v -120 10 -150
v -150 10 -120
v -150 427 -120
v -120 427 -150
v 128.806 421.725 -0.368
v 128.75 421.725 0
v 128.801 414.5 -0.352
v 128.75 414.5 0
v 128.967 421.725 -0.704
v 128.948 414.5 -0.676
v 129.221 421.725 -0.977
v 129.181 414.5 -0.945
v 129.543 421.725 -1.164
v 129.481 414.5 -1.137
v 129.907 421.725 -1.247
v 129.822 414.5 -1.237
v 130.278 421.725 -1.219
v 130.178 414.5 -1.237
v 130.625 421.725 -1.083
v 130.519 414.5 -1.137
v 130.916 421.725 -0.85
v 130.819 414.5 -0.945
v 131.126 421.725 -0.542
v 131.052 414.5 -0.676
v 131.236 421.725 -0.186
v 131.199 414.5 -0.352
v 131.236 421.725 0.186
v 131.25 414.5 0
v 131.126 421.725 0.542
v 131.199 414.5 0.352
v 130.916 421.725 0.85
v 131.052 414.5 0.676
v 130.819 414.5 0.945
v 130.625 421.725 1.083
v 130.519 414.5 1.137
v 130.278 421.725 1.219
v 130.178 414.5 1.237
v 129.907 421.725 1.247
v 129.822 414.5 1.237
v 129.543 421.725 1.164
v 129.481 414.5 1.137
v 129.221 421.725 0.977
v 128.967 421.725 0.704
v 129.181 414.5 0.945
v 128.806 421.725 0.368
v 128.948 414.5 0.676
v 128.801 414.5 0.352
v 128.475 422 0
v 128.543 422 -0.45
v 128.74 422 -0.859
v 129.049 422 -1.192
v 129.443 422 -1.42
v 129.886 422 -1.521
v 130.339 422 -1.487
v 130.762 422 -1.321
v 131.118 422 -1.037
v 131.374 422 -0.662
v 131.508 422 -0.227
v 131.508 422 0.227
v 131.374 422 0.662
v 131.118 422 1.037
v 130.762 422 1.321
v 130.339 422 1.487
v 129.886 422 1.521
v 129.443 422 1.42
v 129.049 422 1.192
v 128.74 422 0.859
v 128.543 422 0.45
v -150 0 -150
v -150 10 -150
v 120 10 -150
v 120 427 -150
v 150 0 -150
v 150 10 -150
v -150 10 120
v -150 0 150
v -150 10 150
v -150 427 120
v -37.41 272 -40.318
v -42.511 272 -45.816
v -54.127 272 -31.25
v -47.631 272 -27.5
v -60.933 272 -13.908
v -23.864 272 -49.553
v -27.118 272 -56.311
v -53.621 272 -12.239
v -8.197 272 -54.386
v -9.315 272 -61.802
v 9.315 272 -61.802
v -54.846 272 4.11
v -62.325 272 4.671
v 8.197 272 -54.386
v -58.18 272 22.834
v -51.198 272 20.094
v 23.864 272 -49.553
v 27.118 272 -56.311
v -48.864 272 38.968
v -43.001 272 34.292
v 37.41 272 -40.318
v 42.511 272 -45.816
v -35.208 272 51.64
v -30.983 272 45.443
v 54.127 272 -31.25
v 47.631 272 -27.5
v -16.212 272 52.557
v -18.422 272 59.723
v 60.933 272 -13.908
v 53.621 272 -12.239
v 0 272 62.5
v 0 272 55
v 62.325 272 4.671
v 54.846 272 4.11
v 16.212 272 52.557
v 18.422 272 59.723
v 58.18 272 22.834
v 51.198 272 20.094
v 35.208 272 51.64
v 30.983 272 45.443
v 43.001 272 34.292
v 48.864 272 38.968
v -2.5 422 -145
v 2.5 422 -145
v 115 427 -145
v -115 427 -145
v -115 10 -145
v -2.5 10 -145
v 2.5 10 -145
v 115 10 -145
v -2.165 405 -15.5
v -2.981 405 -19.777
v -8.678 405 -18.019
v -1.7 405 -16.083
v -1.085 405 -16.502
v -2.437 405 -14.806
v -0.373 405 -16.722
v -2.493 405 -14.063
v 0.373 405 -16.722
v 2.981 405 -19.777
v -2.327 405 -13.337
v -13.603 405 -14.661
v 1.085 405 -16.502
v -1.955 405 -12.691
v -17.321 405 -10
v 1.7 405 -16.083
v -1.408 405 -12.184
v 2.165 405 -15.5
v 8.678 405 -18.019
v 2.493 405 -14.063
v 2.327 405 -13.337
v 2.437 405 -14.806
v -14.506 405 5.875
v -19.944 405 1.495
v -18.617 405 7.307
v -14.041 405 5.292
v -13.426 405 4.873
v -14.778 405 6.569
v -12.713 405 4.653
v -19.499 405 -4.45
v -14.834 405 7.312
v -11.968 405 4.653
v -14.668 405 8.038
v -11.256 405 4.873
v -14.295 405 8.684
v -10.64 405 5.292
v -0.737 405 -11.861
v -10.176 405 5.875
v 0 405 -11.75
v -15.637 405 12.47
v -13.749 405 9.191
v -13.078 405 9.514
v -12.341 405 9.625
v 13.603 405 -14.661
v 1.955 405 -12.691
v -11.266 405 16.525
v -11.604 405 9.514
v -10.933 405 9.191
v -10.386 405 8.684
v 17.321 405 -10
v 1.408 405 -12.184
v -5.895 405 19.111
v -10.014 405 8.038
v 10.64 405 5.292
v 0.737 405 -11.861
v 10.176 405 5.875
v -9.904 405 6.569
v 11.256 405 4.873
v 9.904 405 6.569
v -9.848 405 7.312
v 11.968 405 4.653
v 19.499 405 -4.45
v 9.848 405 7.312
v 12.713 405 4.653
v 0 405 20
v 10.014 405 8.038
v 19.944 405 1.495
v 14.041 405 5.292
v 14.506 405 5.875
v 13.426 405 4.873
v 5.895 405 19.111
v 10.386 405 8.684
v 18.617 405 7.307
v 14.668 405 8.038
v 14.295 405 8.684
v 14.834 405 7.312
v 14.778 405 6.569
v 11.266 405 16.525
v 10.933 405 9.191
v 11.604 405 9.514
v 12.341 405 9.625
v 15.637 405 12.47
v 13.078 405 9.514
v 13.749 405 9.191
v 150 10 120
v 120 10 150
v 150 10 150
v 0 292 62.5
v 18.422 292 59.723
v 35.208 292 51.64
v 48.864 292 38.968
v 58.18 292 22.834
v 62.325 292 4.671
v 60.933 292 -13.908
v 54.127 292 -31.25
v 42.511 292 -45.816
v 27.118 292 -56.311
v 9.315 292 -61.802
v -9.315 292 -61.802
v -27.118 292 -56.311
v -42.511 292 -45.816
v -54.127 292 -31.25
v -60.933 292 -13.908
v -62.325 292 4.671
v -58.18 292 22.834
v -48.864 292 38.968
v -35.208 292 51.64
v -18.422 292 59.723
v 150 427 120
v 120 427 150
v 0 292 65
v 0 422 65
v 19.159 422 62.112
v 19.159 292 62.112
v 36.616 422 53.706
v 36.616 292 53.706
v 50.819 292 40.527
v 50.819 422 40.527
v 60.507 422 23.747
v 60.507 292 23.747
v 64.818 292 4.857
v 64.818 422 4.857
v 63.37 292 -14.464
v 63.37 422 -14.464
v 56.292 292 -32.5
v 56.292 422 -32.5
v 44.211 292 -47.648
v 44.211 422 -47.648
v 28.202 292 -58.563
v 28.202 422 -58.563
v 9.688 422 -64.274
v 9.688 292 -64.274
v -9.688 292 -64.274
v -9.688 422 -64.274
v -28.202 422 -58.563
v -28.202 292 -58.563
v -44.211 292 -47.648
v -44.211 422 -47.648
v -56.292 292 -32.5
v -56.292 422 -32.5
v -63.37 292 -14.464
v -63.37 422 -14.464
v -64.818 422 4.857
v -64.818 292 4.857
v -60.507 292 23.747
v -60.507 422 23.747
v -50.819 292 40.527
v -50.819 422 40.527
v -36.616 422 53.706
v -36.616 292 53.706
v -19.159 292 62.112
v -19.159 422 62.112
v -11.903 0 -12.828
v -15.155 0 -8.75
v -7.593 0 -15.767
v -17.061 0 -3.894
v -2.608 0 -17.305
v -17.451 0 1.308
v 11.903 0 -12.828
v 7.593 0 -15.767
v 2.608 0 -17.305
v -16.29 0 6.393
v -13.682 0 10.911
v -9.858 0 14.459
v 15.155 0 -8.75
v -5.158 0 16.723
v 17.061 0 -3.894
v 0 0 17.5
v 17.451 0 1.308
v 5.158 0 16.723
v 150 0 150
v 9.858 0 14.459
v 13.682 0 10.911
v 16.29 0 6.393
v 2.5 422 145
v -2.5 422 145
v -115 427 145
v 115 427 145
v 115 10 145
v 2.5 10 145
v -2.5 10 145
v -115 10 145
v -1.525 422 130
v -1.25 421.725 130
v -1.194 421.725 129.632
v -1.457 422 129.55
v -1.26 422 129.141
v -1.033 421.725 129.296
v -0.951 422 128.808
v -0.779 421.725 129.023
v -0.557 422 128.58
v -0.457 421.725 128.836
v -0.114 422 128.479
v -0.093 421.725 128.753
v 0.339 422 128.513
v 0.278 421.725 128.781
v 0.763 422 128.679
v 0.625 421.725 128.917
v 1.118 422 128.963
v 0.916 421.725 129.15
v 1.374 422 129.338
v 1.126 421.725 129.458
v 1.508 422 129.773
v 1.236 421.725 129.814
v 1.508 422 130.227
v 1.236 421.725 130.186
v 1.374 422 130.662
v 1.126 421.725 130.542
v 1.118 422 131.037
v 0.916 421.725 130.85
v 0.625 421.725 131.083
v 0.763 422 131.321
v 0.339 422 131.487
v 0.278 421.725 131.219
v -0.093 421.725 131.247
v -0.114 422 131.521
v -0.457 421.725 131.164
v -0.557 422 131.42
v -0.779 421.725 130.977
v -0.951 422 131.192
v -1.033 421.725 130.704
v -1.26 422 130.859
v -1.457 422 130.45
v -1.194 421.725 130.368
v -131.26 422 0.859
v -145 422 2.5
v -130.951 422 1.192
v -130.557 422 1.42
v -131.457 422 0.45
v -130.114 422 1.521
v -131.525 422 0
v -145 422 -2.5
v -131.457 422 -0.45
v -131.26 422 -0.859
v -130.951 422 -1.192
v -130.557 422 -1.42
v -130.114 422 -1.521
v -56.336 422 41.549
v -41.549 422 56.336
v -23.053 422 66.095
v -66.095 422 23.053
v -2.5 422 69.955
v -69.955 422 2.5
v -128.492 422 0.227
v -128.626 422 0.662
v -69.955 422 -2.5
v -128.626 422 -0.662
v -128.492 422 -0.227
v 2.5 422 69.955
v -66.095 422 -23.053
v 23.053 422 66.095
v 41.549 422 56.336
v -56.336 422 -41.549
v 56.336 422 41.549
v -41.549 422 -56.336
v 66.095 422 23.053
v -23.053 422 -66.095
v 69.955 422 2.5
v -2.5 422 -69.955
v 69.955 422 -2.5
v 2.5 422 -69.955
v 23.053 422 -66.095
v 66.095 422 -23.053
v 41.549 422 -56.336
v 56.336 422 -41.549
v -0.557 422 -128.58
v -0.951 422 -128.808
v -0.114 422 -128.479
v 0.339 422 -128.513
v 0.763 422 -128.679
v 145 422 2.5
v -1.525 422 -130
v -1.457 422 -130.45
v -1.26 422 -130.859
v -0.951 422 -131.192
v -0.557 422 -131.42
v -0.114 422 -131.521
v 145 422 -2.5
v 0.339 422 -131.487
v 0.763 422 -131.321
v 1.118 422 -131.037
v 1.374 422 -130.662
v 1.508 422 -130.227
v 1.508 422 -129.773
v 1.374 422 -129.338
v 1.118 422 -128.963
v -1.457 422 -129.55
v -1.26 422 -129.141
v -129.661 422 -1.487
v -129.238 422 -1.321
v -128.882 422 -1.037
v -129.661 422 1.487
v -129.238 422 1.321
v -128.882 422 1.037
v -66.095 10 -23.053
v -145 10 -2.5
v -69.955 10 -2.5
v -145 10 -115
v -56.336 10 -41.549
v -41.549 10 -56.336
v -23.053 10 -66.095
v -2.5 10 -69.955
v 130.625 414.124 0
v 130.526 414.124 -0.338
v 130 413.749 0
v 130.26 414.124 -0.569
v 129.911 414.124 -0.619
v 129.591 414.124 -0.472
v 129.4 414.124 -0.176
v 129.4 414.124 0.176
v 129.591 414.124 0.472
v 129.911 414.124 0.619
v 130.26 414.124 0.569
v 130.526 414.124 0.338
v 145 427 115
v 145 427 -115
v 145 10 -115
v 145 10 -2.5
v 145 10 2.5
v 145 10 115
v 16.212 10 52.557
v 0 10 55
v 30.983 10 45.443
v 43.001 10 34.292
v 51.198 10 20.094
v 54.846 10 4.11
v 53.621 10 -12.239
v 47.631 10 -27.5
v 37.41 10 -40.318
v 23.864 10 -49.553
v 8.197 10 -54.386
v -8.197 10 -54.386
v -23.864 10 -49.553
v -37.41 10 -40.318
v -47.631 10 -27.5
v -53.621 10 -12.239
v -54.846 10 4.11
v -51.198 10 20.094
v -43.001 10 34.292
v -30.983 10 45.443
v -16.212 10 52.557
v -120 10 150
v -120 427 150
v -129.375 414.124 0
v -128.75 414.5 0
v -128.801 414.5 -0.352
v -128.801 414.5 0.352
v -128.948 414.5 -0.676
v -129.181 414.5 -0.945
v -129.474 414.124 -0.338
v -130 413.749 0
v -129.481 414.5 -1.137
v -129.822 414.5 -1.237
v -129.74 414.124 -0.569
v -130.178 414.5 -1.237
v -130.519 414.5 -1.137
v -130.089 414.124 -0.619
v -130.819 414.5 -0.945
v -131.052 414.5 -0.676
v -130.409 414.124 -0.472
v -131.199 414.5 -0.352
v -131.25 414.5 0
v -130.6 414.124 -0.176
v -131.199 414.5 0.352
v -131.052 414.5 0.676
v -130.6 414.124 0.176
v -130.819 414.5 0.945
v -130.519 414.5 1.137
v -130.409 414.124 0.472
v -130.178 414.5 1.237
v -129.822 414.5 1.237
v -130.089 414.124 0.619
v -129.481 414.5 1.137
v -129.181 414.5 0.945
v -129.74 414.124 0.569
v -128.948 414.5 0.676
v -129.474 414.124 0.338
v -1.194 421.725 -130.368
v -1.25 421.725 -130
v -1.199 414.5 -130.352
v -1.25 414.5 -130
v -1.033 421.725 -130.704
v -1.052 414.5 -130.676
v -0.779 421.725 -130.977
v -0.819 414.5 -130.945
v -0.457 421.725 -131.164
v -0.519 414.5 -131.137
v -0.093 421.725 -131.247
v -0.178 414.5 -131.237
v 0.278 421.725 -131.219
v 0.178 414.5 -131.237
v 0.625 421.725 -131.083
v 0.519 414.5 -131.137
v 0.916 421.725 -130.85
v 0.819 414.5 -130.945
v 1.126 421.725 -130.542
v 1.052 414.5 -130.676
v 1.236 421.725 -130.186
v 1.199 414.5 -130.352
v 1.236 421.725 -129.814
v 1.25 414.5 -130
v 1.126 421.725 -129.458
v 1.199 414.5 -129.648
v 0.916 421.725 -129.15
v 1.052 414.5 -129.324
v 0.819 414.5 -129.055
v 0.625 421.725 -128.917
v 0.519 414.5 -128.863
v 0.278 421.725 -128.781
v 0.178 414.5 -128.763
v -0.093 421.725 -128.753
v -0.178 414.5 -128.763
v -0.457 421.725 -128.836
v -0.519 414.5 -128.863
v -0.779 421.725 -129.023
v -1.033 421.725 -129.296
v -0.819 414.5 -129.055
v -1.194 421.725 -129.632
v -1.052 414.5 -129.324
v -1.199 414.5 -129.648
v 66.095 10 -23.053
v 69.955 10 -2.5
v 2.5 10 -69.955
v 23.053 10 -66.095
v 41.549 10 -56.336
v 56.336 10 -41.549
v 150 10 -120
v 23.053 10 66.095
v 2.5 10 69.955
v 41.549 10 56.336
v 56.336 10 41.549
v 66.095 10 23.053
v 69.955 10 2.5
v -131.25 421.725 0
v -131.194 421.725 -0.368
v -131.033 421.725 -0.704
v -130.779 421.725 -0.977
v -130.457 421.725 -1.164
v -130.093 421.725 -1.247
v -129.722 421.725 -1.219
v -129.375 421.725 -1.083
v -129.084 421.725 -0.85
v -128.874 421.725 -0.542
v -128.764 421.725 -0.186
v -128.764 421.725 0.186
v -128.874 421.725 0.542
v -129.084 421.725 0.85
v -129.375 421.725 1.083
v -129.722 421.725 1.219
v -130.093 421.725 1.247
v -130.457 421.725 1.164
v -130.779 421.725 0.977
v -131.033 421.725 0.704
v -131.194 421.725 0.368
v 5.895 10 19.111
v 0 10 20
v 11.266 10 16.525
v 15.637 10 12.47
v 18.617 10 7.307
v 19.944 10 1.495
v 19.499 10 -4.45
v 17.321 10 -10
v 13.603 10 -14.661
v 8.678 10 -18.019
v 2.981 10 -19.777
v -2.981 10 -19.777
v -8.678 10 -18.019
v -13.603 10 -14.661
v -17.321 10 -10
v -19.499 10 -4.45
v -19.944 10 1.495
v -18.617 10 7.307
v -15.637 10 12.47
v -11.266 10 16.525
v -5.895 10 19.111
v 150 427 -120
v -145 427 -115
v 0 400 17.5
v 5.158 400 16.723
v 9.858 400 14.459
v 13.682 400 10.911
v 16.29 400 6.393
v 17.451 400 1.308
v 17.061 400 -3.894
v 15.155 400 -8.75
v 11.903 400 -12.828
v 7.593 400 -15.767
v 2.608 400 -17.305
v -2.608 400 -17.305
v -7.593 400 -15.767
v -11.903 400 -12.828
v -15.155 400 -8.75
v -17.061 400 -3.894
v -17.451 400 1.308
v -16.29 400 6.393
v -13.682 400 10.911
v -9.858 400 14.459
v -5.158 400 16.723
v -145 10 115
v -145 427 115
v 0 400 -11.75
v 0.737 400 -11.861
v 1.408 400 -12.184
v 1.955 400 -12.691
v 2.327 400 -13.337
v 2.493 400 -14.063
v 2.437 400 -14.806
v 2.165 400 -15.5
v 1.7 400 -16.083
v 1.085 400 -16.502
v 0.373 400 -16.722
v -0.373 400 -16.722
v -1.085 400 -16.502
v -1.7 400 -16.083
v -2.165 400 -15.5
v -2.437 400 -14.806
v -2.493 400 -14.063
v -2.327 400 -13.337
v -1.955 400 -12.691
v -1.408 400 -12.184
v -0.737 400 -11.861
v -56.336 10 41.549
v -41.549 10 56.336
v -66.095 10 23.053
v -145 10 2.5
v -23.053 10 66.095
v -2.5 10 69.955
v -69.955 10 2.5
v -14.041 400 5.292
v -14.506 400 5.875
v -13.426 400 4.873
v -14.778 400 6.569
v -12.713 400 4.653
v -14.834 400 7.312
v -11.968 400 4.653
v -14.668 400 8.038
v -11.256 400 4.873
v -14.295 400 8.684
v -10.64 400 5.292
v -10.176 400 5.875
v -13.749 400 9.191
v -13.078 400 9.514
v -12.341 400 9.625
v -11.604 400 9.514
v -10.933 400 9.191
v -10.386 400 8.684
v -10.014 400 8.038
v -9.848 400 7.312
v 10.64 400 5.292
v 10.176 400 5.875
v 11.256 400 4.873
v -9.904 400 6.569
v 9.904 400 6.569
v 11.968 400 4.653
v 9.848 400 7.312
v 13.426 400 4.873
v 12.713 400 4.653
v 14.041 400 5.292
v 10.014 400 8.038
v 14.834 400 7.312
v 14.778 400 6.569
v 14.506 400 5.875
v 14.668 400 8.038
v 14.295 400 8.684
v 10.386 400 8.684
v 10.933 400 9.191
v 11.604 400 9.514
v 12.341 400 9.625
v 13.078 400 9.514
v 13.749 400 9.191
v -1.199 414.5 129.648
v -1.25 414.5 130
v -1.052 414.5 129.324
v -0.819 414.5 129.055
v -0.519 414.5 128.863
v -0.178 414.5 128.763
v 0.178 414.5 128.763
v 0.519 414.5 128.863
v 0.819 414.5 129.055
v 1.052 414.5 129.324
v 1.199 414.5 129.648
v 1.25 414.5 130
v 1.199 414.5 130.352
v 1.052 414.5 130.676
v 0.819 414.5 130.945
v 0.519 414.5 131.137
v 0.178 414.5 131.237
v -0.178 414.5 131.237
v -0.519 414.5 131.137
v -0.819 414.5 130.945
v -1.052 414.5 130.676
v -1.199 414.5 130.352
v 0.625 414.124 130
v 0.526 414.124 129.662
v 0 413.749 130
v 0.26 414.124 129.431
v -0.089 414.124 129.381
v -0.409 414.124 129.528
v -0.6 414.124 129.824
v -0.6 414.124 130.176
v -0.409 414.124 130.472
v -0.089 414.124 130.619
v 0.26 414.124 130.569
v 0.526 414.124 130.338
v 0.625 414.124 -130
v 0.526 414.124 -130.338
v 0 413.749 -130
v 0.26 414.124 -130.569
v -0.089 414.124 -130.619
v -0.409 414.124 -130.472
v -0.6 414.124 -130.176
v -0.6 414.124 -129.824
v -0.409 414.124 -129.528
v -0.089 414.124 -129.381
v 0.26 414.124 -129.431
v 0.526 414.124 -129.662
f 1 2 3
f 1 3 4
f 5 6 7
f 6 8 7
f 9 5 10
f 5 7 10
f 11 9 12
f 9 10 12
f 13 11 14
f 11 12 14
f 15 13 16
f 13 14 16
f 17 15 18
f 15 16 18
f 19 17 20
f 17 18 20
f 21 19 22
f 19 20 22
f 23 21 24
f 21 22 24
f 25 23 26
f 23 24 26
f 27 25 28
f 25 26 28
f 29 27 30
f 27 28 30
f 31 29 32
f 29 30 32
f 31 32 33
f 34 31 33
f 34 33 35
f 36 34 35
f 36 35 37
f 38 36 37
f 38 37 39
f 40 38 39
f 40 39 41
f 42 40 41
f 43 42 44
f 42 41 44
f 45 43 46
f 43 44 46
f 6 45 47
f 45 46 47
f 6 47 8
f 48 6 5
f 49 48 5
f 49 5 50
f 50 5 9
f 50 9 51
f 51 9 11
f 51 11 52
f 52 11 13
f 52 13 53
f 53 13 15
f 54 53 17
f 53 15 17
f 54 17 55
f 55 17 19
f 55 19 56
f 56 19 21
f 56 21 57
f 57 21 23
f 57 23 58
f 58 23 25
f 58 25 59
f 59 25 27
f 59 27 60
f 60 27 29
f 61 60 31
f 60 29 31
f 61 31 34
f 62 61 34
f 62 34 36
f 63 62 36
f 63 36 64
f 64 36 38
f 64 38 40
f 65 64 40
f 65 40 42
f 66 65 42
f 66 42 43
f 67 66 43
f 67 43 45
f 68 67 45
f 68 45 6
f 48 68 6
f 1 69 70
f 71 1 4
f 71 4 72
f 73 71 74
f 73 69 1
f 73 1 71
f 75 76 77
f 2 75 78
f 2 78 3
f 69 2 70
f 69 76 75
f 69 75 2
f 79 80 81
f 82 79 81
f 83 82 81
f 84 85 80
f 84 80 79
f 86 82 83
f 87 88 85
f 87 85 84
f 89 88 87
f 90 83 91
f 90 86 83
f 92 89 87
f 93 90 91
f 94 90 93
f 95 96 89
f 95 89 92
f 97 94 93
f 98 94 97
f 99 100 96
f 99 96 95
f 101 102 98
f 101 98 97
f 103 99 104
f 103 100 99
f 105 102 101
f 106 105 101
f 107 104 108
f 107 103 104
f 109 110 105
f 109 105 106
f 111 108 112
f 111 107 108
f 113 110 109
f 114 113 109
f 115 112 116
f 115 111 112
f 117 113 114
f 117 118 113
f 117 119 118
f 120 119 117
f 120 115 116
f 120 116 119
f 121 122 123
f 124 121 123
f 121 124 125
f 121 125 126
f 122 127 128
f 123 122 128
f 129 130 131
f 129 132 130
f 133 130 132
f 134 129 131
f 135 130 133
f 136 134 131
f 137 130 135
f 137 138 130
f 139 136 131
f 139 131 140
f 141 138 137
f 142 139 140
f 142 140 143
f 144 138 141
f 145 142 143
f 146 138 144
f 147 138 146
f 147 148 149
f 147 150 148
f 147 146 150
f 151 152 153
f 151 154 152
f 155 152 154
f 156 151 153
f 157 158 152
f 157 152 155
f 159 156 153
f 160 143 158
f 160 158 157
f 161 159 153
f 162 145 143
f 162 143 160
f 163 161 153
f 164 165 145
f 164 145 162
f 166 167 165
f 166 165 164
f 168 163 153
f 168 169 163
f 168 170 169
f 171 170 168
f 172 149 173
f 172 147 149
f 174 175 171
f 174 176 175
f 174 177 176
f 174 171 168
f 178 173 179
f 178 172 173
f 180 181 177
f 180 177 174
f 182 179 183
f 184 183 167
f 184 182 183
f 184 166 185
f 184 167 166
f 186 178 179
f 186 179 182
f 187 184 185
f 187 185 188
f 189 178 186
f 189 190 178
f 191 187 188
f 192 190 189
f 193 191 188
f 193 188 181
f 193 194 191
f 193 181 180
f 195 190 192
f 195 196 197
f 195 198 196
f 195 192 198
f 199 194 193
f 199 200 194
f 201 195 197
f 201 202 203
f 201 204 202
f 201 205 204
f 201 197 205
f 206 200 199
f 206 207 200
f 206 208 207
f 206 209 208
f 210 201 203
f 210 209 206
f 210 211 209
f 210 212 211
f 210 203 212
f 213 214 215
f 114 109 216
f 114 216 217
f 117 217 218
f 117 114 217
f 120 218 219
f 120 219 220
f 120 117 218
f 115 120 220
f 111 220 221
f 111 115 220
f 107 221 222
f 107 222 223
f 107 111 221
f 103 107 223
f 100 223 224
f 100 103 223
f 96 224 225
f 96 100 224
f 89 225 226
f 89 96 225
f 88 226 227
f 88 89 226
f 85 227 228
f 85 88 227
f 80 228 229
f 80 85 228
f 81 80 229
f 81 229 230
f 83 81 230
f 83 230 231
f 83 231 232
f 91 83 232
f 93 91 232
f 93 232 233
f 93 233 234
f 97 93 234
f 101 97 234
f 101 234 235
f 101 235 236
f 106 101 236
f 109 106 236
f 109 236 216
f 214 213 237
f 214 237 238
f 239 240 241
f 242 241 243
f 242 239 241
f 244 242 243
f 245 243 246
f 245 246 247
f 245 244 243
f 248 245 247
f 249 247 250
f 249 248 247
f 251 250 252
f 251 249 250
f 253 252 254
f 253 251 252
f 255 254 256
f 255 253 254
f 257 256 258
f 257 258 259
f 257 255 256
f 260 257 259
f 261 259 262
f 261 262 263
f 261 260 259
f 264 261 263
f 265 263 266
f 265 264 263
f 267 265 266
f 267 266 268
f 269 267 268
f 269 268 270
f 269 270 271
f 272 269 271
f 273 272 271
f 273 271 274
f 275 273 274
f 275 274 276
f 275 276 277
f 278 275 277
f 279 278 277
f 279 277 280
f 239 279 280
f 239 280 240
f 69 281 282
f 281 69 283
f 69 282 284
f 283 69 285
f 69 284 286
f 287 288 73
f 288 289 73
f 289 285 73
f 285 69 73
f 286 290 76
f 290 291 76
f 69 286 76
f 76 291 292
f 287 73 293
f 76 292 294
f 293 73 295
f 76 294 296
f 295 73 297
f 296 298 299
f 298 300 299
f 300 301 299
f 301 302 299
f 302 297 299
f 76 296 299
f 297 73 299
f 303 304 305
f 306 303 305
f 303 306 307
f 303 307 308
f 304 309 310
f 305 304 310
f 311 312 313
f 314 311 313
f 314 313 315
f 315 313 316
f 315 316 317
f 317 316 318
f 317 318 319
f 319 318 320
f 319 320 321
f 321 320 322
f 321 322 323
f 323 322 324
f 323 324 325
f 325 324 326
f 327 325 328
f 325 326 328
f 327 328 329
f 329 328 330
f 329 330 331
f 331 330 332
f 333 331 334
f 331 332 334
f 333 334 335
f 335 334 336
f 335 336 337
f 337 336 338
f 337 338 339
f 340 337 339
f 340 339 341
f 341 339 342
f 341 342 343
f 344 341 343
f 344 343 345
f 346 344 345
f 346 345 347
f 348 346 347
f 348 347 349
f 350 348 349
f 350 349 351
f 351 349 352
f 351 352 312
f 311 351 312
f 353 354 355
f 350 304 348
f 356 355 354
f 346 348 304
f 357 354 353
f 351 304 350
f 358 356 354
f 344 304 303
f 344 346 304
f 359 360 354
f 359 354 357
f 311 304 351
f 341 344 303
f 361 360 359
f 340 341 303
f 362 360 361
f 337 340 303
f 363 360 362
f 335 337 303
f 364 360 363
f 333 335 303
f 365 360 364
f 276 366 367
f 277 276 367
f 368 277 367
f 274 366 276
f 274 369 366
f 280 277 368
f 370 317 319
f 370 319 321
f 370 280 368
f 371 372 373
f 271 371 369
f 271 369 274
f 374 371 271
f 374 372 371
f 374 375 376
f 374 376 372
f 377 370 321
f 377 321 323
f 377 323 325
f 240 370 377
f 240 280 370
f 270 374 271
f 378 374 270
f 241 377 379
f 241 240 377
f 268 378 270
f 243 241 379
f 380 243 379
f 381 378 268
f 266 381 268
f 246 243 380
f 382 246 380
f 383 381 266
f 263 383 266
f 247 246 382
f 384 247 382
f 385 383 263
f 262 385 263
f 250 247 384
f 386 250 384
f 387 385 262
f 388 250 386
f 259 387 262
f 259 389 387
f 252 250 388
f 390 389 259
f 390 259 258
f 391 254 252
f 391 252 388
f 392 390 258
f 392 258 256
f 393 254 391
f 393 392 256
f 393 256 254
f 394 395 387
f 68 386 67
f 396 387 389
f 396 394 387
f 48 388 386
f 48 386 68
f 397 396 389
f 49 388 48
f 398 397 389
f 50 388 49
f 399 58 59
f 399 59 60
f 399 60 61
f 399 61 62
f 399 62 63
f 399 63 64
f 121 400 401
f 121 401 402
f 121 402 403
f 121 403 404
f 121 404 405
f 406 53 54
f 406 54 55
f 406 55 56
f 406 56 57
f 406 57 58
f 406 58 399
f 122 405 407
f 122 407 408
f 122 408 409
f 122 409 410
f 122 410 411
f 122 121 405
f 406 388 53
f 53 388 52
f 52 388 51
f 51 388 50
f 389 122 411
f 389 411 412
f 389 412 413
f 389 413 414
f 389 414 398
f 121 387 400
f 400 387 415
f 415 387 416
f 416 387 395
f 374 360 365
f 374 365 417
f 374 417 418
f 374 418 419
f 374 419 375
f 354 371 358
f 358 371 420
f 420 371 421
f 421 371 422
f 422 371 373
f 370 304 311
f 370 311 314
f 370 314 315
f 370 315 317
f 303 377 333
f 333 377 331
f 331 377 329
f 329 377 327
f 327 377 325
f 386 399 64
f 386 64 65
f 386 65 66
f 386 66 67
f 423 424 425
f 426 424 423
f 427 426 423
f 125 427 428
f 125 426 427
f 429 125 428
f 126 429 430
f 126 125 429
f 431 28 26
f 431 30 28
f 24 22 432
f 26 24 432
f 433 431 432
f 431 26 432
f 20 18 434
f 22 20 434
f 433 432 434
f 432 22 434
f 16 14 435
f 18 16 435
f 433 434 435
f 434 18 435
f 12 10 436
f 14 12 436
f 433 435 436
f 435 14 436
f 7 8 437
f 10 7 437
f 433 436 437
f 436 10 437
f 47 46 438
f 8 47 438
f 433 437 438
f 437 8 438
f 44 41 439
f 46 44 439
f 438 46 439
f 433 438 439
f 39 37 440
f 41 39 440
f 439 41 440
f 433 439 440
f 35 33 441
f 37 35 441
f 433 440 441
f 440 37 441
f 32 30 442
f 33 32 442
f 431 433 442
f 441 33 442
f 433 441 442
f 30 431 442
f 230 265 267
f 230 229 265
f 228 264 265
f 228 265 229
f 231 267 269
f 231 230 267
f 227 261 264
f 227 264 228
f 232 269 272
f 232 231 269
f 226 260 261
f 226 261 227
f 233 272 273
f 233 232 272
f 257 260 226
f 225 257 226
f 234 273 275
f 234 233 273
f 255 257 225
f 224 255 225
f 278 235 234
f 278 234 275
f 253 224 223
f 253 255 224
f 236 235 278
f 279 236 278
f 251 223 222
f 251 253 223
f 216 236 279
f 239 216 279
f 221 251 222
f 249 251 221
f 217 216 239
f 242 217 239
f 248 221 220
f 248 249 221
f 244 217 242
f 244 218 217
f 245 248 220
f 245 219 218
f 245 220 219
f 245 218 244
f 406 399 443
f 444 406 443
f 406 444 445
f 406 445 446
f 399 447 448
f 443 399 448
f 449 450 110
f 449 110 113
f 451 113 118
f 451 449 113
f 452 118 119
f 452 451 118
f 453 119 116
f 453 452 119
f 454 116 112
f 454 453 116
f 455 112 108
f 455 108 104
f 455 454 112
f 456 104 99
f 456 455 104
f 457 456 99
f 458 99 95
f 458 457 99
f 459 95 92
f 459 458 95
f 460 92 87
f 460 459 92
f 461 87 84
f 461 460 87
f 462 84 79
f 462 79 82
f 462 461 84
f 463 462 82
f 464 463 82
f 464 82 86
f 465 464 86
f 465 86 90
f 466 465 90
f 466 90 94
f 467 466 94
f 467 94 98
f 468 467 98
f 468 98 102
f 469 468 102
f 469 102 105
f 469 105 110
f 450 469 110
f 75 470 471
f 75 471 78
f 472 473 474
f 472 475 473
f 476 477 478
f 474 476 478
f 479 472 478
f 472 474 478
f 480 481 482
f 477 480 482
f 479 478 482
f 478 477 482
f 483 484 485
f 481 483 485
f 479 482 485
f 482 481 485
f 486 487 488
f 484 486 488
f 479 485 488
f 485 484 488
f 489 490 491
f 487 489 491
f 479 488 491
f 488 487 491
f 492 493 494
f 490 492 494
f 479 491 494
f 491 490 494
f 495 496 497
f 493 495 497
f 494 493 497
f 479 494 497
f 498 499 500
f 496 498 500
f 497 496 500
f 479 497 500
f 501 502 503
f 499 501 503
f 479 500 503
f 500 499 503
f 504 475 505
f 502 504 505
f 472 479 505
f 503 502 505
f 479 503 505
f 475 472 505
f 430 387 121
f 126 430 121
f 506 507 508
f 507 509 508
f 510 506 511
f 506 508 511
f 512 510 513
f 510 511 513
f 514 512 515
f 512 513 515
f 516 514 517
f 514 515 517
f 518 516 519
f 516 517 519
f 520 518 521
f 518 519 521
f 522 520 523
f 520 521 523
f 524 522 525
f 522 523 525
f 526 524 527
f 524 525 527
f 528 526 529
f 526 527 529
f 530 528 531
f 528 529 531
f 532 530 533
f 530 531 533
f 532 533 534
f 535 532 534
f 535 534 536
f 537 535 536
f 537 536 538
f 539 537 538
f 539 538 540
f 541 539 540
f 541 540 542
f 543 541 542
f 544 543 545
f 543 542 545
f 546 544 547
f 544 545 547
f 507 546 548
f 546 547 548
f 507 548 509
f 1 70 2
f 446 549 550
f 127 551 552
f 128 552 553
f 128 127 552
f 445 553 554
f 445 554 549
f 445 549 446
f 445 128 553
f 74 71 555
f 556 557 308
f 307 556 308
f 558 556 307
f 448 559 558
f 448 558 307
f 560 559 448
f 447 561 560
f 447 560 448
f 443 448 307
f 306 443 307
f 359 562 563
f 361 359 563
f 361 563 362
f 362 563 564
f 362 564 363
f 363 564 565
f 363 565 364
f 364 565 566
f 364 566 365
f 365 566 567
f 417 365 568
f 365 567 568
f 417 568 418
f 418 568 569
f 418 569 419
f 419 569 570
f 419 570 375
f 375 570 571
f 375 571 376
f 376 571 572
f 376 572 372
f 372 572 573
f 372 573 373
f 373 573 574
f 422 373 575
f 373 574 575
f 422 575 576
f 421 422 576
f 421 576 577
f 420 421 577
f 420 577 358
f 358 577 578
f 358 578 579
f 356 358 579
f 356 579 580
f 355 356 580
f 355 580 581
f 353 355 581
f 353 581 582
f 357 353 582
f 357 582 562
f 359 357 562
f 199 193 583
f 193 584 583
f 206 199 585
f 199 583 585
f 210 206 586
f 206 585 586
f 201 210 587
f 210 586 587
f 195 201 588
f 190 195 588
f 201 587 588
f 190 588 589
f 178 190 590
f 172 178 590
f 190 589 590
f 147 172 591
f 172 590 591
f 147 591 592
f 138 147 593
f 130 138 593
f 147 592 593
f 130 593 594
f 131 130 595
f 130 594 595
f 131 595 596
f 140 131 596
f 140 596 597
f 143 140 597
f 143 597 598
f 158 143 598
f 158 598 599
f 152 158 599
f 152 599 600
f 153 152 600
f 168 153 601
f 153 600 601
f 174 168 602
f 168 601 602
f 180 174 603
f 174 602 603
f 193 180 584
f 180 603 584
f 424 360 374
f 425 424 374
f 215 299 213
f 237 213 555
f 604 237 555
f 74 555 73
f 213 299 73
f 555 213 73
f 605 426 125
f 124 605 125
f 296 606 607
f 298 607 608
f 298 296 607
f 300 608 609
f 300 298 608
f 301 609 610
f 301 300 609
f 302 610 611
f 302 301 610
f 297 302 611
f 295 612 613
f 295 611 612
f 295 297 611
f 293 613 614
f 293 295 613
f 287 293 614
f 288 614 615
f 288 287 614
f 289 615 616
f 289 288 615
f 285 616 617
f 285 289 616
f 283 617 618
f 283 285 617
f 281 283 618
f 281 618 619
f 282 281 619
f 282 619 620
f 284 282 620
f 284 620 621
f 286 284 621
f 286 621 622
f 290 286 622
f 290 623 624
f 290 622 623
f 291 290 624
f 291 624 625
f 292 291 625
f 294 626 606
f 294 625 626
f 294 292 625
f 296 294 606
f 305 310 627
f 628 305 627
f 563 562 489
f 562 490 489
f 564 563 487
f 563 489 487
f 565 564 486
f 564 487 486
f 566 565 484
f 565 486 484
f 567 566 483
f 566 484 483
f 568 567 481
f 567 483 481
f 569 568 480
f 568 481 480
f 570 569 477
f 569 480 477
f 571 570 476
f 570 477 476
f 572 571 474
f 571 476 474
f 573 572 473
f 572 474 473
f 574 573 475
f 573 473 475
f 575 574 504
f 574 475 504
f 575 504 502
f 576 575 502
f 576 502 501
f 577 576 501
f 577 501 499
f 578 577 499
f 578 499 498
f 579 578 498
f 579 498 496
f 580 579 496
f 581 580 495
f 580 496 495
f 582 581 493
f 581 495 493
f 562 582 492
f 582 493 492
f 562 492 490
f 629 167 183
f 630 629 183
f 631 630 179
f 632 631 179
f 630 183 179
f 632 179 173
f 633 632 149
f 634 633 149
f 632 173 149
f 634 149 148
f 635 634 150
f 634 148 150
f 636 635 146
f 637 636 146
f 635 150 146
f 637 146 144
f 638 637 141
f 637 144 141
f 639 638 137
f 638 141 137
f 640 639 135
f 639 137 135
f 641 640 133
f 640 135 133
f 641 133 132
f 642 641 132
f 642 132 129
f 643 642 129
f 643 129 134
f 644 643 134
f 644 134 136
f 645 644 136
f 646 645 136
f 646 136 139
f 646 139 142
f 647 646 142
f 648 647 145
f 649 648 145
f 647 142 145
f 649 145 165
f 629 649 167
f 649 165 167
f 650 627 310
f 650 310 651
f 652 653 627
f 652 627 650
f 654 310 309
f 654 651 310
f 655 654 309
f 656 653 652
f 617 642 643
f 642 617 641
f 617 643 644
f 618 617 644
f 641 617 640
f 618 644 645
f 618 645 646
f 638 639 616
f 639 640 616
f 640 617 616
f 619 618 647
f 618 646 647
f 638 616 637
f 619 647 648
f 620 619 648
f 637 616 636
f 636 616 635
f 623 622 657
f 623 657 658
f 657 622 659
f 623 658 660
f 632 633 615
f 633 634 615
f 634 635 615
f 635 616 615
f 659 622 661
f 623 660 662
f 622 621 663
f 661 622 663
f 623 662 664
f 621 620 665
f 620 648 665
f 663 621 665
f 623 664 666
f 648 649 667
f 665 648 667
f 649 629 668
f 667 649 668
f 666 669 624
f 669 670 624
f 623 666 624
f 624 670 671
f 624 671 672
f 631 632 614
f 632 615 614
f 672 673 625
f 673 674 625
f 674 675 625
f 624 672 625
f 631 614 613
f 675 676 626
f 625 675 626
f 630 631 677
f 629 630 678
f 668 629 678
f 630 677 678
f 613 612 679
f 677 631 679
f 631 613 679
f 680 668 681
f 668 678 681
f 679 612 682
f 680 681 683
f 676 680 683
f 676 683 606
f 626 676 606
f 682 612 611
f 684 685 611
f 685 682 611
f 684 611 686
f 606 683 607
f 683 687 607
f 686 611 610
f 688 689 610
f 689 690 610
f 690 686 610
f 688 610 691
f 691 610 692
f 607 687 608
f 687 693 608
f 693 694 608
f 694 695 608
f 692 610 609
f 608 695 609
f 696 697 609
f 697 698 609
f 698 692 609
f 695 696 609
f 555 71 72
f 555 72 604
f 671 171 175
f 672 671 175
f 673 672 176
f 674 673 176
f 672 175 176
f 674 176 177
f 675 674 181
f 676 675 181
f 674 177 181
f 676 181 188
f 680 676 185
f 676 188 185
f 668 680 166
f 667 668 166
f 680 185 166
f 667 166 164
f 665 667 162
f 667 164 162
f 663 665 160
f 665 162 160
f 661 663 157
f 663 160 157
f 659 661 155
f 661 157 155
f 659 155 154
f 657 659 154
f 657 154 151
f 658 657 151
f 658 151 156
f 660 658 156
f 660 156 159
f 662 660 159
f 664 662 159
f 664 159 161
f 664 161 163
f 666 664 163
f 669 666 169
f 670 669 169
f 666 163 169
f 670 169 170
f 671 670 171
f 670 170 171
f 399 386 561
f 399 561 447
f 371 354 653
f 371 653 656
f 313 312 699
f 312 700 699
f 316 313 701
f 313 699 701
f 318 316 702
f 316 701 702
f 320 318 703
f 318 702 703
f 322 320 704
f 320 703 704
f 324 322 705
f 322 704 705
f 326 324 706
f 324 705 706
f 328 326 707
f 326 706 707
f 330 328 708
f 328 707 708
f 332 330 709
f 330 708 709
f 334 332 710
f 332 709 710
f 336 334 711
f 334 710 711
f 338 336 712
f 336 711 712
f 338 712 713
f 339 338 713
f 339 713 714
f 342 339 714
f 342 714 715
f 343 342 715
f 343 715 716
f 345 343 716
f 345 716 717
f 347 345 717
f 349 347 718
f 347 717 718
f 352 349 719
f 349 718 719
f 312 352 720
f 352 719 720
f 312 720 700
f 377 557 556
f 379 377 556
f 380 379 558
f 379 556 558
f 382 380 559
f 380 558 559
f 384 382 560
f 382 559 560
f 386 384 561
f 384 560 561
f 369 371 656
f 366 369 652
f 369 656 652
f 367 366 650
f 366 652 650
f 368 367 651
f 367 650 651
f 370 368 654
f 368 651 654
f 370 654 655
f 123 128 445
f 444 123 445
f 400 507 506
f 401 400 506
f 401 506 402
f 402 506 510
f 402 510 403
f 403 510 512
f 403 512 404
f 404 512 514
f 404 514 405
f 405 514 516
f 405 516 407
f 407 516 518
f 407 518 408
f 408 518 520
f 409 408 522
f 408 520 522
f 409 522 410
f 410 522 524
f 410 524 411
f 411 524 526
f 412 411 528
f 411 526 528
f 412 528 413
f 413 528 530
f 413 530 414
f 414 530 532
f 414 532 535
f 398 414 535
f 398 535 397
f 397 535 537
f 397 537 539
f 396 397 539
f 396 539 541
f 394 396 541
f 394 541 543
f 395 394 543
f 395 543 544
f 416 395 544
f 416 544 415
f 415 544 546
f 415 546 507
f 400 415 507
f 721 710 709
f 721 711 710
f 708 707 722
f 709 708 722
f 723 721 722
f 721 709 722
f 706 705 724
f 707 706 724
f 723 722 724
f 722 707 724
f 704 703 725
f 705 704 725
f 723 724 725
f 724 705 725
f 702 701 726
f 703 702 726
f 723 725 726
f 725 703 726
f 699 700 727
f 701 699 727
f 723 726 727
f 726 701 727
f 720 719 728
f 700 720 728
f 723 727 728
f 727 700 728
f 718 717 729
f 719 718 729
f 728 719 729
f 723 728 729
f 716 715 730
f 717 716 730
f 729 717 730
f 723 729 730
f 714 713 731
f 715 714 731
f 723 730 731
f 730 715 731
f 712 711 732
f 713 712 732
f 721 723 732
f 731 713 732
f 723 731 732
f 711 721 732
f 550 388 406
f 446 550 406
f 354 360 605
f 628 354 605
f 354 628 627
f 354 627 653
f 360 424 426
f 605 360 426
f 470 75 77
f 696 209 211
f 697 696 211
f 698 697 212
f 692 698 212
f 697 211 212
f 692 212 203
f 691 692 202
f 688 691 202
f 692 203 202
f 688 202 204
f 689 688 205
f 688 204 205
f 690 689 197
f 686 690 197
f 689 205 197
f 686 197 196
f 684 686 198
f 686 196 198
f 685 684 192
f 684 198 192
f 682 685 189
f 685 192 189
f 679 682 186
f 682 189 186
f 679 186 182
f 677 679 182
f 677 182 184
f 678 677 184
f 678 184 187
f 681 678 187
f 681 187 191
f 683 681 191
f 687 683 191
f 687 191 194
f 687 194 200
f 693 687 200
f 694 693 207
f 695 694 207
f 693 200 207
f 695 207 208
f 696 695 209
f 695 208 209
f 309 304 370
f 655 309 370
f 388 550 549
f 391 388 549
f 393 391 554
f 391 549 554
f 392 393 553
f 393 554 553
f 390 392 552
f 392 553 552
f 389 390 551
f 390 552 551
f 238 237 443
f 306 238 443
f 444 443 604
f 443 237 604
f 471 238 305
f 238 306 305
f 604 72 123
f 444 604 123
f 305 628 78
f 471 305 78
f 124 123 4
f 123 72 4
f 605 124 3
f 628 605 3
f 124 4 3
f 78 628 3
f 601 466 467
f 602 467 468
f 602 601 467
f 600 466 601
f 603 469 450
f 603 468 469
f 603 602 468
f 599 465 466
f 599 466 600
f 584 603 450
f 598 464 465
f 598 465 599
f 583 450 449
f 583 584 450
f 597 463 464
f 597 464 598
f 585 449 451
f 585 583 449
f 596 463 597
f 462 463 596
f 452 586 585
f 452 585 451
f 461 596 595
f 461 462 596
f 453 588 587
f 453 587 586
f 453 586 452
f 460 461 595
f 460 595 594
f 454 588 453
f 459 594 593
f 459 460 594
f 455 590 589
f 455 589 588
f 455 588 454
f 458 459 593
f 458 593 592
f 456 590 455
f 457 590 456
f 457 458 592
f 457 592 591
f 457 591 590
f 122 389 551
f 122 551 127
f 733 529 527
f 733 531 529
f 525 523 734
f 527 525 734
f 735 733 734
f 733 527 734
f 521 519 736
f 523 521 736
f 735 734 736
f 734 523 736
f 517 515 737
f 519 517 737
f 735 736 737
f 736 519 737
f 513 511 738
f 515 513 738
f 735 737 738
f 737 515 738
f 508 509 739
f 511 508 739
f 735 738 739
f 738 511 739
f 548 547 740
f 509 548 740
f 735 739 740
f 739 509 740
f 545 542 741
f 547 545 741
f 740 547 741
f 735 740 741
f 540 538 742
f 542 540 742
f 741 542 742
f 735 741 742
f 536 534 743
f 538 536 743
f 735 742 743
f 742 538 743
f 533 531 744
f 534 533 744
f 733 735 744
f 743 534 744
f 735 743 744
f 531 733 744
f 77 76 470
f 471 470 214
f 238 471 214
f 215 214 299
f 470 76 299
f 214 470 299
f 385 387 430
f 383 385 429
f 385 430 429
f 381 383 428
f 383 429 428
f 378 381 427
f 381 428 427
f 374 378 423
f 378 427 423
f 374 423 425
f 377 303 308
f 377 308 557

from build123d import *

# Parameters (mm, degrees)
SKETCH1_W                   = 300
SKETCH1_H                   = 300
SKETCH1_R                   = 17.5
BOSS_EXTRUDE1_DEPTH         = 10
SKETCH1_3_R                 = 65
SKETCH1_3_R_2               = 62.5
BOSS_EXTRUDE2_DEPTH         = 292
SKETCH1_4_R                 = 70
SKETCH1_4_R_2               = 65
BOSS_EXTRUDE3_DEPTH         = 422
SKETCH1_5_R                 = 20
SKETCH1_5_R_2               = 17.5
BOSS_EXTRUDE4_DEPTH         = 405
BOSS_EXTRUDE5_START         = -5
SKETCH3_R                   = 20
BOSS_EXTRUDE5_DEPTH         = 5
SKETCH4_R                   = 2.5
CUT_EXTRUDE1_DEPTH          = 5
BOSS_EXTRUDE6_DEPTH         = 427
RIB3_REACH                  = 474.318
SKETCH7_WALLS_W             = 1023.664705026
SKETCH7_WALLS_H             = 5
SKETCH7_WALLS_W_2           = 1024.247045089
SKETCH7_WALLS_W_3           = 5
SKETCH7_WALLS_H_2           = 1023.987417205
SKETCH7_WALLS_H_3           = 1024.344484495
M3_TAPPED_HOLE1_D           = 2.5
M3_TAPPED_HOLE1_DEPTH       = 7.5
M3_TAPPED_HOLE1_CSINK_D     = 3.05
M3_TAPPED_HOLE1_CSINK_ANGLE = 90
M3_TAPPED_HOLE1_TIP         = 0.751075774
SKETCH1_6_R                 = 62.5
SKETCH1_6_R_2               = 55
BOSS_EXTRUDE7_DEPTH         = 272


with BuildPart() as part:
    # Sketch1 → Boss-Extrude1 (new body)
    with BuildSketch(Plane(origin=(0, 0, 0), x_dir=(1, 0, 0), z_dir=(0, 1, 0))):
        Rectangle(SKETCH1_W, SKETCH1_H)
        Circle(SKETCH1_R, mode=Mode.SUBTRACT)
    extrude(amount=BOSS_EXTRUDE1_DEPTH)

    # Sketch1<3> → Boss-Extrude2 (add)
    with BuildSketch(Plane(origin=(0, 0, 0), x_dir=(1, 0, 0), z_dir=(0, 1, 0))):
        Circle(SKETCH1_3_R)
        Circle(SKETCH1_3_R_2, mode=Mode.SUBTRACT)
    extrude(amount=BOSS_EXTRUDE2_DEPTH)

    # Sketch1<4> → Boss-Extrude3 (add)
    with BuildSketch(Plane(origin=(0, 0, 0), x_dir=(1, 0, 0), z_dir=(0, 1, 0))):
        Circle(SKETCH1_4_R)
        Circle(SKETCH1_4_R_2, mode=Mode.SUBTRACT)
    extrude(amount=BOSS_EXTRUDE3_DEPTH)

    # Sketch1<5> → Boss-Extrude4 (add)
    with BuildSketch(Plane(origin=(0, 0, 0), x_dir=(1, 0, 0), z_dir=(0, 1, 0))):
        Circle(SKETCH1_5_R)
        Circle(SKETCH1_5_R_2, mode=Mode.SUBTRACT)
    extrude(amount=BOSS_EXTRUDE4_DEPTH)

    # Sketch3 → Boss-Extrude5 (add)
    with BuildSketch(Plane(origin=(0, 405, 0), x_dir=(1, 0, 0), z_dir=(0, 1, 0)).offset(BOSS_EXTRUDE5_START)):
        Circle(SKETCH3_R)
    extrude(amount=BOSS_EXTRUDE5_DEPTH)

    # Sketch4 → Cut-Extrude1 (cut)
    with BuildSketch(Plane(origin=(0, 405, 0), x_dir=(1, 0, 0), z_dir=(0, 1, 0))):
        with Locations((0, 14.25)):
            Circle(SKETCH4_R)
        with Locations((12.340862004, -7.125)):
            Circle(SKETCH4_R)
        with Locations((-12.340862004, -7.125)):
            Circle(SKETCH4_R)
    extrude(amount=-CUT_EXTRUDE1_DEPTH, mode=Mode.SUBTRACT)

    # Sketch6 → Boss-Extrude6 (add)
    with BuildSketch(Plane(origin=(0, 0, 0), x_dir=(1, 0, 0), z_dir=(0, 1, 0))):
        Polygon((-120, 150), (120, 150), (150, 120), (150, -120), (120, -150), (-120, -150), (-150, -120), (-150, 120), align=None)
        Polygon((115, 145), (145, 115), (145, -115), (115, -145), (-115, -145), (-145, -115), (-145, 115), (-115, 145), align=None, mode=Mode.SUBTRACT)
    extrude(amount=BOSS_EXTRUDE6_DEPTH)

    # Sketch7 walls → Rib3 (add, up to next)
    with BuildSketch(Plane(origin=(0, 422, 0), x_dir=(1, 0, 0), z_dir=(0, 1, 0)), mode=Mode.PRIVATE) as rib3_sk1:
        with Locations((106.485337183, 0)):
            Rectangle(SKETCH7_WALLS_W, SKETCH7_WALLS_H)
    rib3_tool1 = extrude(rib3_sk1.sketch, amount=-RIB3_REACH, mode=Mode.PRIVATE) - part.part
    # Sketch7 walls → Rib3 (add, up to next)
    with BuildSketch(Plane(origin=(0, 422, 0), x_dir=(1, 0, 0), z_dir=(0, 1, 0)), mode=Mode.PRIVATE) as rib3_sk2:
        with Locations((-106.194167151, 0)):
            Rectangle(SKETCH7_WALLS_W_2, SKETCH7_WALLS_H)
    rib3_tool2 = extrude(rib3_sk2.sketch, amount=-RIB3_REACH, mode=Mode.PRIVATE) - part.part
    # Sketch7 walls → Rib3 (add, up to next)
    with BuildSketch(Plane(origin=(0, 422, 0), x_dir=(1, 0, 0), z_dir=(0, 1, 0)), mode=Mode.PRIVATE) as rib3_sk3:
        with Locations((0, 106.323981093)):
            Rectangle(SKETCH7_WALLS_W_3, SKETCH7_WALLS_H_2)
    rib3_tool3 = extrude(rib3_sk3.sketch, amount=-RIB3_REACH, mode=Mode.PRIVATE) - part.part
    # Sketch7 walls → Rib3 (add, up to next)
    with BuildSketch(Plane(origin=(0, 422, 0), x_dir=(1, 0, 0), z_dir=(0, 1, 0)), mode=Mode.PRIVATE) as rib3_sk4:
        with Locations((0, -106.145447448)):
            Rectangle(SKETCH7_WALLS_W_3, SKETCH7_WALLS_H_3)
    rib3_tool4 = extrude(rib3_sk4.sketch, amount=-RIB3_REACH, mode=Mode.PRIVATE) - part.part
    add(rib3_tool1.solids().sort_by_distance((106.485337183, 422, 0))[0])
    add(rib3_tool2.solids().sort_by_distance((-106.194167152, 422, 0))[0])
    add(rib3_tool3.solids().sort_by_distance((0, 422, -106.323981094))[0])
    add(rib3_tool4.solids().sort_by_distance((0, 422, 106.145447449))[0])

    # M3 Tapped Hole1
    with Locations(Plane(origin=(0, 422, 0), x_dir=(1, 0, 0), z_dir=(0, 1, 0))):
        with Locations((0, 130), (130, 0), (0, -130), (-130, 0)):
            CounterSinkHole(M3_TAPPED_HOLE1_D / 2, M3_TAPPED_HOLE1_CSINK_D / 2, depth=M3_TAPPED_HOLE1_DEPTH, counter_sink_angle=M3_TAPPED_HOLE1_CSINK_ANGLE)
            with Locations((0, 0, -(M3_TAPPED_HOLE1_DEPTH + M3_TAPPED_HOLE1_TIP / 2))):  # 118° drill point
                Cone(0, M3_TAPPED_HOLE1_D / 2, M3_TAPPED_HOLE1_TIP, mode=Mode.SUBTRACT)

    # Sketch1<6> → Boss-Extrude7 (add)
    with BuildSketch(Plane(origin=(0, 0, 0), x_dir=(1, 0, 0), z_dir=(0, 1, 0))):
        Circle(SKETCH1_6_R)
        Circle(SKETCH1_6_R_2, mode=Mode.SUBTRACT)
    extrude(amount=BOSS_EXTRUDE7_DEPTH)


solid = part.part
